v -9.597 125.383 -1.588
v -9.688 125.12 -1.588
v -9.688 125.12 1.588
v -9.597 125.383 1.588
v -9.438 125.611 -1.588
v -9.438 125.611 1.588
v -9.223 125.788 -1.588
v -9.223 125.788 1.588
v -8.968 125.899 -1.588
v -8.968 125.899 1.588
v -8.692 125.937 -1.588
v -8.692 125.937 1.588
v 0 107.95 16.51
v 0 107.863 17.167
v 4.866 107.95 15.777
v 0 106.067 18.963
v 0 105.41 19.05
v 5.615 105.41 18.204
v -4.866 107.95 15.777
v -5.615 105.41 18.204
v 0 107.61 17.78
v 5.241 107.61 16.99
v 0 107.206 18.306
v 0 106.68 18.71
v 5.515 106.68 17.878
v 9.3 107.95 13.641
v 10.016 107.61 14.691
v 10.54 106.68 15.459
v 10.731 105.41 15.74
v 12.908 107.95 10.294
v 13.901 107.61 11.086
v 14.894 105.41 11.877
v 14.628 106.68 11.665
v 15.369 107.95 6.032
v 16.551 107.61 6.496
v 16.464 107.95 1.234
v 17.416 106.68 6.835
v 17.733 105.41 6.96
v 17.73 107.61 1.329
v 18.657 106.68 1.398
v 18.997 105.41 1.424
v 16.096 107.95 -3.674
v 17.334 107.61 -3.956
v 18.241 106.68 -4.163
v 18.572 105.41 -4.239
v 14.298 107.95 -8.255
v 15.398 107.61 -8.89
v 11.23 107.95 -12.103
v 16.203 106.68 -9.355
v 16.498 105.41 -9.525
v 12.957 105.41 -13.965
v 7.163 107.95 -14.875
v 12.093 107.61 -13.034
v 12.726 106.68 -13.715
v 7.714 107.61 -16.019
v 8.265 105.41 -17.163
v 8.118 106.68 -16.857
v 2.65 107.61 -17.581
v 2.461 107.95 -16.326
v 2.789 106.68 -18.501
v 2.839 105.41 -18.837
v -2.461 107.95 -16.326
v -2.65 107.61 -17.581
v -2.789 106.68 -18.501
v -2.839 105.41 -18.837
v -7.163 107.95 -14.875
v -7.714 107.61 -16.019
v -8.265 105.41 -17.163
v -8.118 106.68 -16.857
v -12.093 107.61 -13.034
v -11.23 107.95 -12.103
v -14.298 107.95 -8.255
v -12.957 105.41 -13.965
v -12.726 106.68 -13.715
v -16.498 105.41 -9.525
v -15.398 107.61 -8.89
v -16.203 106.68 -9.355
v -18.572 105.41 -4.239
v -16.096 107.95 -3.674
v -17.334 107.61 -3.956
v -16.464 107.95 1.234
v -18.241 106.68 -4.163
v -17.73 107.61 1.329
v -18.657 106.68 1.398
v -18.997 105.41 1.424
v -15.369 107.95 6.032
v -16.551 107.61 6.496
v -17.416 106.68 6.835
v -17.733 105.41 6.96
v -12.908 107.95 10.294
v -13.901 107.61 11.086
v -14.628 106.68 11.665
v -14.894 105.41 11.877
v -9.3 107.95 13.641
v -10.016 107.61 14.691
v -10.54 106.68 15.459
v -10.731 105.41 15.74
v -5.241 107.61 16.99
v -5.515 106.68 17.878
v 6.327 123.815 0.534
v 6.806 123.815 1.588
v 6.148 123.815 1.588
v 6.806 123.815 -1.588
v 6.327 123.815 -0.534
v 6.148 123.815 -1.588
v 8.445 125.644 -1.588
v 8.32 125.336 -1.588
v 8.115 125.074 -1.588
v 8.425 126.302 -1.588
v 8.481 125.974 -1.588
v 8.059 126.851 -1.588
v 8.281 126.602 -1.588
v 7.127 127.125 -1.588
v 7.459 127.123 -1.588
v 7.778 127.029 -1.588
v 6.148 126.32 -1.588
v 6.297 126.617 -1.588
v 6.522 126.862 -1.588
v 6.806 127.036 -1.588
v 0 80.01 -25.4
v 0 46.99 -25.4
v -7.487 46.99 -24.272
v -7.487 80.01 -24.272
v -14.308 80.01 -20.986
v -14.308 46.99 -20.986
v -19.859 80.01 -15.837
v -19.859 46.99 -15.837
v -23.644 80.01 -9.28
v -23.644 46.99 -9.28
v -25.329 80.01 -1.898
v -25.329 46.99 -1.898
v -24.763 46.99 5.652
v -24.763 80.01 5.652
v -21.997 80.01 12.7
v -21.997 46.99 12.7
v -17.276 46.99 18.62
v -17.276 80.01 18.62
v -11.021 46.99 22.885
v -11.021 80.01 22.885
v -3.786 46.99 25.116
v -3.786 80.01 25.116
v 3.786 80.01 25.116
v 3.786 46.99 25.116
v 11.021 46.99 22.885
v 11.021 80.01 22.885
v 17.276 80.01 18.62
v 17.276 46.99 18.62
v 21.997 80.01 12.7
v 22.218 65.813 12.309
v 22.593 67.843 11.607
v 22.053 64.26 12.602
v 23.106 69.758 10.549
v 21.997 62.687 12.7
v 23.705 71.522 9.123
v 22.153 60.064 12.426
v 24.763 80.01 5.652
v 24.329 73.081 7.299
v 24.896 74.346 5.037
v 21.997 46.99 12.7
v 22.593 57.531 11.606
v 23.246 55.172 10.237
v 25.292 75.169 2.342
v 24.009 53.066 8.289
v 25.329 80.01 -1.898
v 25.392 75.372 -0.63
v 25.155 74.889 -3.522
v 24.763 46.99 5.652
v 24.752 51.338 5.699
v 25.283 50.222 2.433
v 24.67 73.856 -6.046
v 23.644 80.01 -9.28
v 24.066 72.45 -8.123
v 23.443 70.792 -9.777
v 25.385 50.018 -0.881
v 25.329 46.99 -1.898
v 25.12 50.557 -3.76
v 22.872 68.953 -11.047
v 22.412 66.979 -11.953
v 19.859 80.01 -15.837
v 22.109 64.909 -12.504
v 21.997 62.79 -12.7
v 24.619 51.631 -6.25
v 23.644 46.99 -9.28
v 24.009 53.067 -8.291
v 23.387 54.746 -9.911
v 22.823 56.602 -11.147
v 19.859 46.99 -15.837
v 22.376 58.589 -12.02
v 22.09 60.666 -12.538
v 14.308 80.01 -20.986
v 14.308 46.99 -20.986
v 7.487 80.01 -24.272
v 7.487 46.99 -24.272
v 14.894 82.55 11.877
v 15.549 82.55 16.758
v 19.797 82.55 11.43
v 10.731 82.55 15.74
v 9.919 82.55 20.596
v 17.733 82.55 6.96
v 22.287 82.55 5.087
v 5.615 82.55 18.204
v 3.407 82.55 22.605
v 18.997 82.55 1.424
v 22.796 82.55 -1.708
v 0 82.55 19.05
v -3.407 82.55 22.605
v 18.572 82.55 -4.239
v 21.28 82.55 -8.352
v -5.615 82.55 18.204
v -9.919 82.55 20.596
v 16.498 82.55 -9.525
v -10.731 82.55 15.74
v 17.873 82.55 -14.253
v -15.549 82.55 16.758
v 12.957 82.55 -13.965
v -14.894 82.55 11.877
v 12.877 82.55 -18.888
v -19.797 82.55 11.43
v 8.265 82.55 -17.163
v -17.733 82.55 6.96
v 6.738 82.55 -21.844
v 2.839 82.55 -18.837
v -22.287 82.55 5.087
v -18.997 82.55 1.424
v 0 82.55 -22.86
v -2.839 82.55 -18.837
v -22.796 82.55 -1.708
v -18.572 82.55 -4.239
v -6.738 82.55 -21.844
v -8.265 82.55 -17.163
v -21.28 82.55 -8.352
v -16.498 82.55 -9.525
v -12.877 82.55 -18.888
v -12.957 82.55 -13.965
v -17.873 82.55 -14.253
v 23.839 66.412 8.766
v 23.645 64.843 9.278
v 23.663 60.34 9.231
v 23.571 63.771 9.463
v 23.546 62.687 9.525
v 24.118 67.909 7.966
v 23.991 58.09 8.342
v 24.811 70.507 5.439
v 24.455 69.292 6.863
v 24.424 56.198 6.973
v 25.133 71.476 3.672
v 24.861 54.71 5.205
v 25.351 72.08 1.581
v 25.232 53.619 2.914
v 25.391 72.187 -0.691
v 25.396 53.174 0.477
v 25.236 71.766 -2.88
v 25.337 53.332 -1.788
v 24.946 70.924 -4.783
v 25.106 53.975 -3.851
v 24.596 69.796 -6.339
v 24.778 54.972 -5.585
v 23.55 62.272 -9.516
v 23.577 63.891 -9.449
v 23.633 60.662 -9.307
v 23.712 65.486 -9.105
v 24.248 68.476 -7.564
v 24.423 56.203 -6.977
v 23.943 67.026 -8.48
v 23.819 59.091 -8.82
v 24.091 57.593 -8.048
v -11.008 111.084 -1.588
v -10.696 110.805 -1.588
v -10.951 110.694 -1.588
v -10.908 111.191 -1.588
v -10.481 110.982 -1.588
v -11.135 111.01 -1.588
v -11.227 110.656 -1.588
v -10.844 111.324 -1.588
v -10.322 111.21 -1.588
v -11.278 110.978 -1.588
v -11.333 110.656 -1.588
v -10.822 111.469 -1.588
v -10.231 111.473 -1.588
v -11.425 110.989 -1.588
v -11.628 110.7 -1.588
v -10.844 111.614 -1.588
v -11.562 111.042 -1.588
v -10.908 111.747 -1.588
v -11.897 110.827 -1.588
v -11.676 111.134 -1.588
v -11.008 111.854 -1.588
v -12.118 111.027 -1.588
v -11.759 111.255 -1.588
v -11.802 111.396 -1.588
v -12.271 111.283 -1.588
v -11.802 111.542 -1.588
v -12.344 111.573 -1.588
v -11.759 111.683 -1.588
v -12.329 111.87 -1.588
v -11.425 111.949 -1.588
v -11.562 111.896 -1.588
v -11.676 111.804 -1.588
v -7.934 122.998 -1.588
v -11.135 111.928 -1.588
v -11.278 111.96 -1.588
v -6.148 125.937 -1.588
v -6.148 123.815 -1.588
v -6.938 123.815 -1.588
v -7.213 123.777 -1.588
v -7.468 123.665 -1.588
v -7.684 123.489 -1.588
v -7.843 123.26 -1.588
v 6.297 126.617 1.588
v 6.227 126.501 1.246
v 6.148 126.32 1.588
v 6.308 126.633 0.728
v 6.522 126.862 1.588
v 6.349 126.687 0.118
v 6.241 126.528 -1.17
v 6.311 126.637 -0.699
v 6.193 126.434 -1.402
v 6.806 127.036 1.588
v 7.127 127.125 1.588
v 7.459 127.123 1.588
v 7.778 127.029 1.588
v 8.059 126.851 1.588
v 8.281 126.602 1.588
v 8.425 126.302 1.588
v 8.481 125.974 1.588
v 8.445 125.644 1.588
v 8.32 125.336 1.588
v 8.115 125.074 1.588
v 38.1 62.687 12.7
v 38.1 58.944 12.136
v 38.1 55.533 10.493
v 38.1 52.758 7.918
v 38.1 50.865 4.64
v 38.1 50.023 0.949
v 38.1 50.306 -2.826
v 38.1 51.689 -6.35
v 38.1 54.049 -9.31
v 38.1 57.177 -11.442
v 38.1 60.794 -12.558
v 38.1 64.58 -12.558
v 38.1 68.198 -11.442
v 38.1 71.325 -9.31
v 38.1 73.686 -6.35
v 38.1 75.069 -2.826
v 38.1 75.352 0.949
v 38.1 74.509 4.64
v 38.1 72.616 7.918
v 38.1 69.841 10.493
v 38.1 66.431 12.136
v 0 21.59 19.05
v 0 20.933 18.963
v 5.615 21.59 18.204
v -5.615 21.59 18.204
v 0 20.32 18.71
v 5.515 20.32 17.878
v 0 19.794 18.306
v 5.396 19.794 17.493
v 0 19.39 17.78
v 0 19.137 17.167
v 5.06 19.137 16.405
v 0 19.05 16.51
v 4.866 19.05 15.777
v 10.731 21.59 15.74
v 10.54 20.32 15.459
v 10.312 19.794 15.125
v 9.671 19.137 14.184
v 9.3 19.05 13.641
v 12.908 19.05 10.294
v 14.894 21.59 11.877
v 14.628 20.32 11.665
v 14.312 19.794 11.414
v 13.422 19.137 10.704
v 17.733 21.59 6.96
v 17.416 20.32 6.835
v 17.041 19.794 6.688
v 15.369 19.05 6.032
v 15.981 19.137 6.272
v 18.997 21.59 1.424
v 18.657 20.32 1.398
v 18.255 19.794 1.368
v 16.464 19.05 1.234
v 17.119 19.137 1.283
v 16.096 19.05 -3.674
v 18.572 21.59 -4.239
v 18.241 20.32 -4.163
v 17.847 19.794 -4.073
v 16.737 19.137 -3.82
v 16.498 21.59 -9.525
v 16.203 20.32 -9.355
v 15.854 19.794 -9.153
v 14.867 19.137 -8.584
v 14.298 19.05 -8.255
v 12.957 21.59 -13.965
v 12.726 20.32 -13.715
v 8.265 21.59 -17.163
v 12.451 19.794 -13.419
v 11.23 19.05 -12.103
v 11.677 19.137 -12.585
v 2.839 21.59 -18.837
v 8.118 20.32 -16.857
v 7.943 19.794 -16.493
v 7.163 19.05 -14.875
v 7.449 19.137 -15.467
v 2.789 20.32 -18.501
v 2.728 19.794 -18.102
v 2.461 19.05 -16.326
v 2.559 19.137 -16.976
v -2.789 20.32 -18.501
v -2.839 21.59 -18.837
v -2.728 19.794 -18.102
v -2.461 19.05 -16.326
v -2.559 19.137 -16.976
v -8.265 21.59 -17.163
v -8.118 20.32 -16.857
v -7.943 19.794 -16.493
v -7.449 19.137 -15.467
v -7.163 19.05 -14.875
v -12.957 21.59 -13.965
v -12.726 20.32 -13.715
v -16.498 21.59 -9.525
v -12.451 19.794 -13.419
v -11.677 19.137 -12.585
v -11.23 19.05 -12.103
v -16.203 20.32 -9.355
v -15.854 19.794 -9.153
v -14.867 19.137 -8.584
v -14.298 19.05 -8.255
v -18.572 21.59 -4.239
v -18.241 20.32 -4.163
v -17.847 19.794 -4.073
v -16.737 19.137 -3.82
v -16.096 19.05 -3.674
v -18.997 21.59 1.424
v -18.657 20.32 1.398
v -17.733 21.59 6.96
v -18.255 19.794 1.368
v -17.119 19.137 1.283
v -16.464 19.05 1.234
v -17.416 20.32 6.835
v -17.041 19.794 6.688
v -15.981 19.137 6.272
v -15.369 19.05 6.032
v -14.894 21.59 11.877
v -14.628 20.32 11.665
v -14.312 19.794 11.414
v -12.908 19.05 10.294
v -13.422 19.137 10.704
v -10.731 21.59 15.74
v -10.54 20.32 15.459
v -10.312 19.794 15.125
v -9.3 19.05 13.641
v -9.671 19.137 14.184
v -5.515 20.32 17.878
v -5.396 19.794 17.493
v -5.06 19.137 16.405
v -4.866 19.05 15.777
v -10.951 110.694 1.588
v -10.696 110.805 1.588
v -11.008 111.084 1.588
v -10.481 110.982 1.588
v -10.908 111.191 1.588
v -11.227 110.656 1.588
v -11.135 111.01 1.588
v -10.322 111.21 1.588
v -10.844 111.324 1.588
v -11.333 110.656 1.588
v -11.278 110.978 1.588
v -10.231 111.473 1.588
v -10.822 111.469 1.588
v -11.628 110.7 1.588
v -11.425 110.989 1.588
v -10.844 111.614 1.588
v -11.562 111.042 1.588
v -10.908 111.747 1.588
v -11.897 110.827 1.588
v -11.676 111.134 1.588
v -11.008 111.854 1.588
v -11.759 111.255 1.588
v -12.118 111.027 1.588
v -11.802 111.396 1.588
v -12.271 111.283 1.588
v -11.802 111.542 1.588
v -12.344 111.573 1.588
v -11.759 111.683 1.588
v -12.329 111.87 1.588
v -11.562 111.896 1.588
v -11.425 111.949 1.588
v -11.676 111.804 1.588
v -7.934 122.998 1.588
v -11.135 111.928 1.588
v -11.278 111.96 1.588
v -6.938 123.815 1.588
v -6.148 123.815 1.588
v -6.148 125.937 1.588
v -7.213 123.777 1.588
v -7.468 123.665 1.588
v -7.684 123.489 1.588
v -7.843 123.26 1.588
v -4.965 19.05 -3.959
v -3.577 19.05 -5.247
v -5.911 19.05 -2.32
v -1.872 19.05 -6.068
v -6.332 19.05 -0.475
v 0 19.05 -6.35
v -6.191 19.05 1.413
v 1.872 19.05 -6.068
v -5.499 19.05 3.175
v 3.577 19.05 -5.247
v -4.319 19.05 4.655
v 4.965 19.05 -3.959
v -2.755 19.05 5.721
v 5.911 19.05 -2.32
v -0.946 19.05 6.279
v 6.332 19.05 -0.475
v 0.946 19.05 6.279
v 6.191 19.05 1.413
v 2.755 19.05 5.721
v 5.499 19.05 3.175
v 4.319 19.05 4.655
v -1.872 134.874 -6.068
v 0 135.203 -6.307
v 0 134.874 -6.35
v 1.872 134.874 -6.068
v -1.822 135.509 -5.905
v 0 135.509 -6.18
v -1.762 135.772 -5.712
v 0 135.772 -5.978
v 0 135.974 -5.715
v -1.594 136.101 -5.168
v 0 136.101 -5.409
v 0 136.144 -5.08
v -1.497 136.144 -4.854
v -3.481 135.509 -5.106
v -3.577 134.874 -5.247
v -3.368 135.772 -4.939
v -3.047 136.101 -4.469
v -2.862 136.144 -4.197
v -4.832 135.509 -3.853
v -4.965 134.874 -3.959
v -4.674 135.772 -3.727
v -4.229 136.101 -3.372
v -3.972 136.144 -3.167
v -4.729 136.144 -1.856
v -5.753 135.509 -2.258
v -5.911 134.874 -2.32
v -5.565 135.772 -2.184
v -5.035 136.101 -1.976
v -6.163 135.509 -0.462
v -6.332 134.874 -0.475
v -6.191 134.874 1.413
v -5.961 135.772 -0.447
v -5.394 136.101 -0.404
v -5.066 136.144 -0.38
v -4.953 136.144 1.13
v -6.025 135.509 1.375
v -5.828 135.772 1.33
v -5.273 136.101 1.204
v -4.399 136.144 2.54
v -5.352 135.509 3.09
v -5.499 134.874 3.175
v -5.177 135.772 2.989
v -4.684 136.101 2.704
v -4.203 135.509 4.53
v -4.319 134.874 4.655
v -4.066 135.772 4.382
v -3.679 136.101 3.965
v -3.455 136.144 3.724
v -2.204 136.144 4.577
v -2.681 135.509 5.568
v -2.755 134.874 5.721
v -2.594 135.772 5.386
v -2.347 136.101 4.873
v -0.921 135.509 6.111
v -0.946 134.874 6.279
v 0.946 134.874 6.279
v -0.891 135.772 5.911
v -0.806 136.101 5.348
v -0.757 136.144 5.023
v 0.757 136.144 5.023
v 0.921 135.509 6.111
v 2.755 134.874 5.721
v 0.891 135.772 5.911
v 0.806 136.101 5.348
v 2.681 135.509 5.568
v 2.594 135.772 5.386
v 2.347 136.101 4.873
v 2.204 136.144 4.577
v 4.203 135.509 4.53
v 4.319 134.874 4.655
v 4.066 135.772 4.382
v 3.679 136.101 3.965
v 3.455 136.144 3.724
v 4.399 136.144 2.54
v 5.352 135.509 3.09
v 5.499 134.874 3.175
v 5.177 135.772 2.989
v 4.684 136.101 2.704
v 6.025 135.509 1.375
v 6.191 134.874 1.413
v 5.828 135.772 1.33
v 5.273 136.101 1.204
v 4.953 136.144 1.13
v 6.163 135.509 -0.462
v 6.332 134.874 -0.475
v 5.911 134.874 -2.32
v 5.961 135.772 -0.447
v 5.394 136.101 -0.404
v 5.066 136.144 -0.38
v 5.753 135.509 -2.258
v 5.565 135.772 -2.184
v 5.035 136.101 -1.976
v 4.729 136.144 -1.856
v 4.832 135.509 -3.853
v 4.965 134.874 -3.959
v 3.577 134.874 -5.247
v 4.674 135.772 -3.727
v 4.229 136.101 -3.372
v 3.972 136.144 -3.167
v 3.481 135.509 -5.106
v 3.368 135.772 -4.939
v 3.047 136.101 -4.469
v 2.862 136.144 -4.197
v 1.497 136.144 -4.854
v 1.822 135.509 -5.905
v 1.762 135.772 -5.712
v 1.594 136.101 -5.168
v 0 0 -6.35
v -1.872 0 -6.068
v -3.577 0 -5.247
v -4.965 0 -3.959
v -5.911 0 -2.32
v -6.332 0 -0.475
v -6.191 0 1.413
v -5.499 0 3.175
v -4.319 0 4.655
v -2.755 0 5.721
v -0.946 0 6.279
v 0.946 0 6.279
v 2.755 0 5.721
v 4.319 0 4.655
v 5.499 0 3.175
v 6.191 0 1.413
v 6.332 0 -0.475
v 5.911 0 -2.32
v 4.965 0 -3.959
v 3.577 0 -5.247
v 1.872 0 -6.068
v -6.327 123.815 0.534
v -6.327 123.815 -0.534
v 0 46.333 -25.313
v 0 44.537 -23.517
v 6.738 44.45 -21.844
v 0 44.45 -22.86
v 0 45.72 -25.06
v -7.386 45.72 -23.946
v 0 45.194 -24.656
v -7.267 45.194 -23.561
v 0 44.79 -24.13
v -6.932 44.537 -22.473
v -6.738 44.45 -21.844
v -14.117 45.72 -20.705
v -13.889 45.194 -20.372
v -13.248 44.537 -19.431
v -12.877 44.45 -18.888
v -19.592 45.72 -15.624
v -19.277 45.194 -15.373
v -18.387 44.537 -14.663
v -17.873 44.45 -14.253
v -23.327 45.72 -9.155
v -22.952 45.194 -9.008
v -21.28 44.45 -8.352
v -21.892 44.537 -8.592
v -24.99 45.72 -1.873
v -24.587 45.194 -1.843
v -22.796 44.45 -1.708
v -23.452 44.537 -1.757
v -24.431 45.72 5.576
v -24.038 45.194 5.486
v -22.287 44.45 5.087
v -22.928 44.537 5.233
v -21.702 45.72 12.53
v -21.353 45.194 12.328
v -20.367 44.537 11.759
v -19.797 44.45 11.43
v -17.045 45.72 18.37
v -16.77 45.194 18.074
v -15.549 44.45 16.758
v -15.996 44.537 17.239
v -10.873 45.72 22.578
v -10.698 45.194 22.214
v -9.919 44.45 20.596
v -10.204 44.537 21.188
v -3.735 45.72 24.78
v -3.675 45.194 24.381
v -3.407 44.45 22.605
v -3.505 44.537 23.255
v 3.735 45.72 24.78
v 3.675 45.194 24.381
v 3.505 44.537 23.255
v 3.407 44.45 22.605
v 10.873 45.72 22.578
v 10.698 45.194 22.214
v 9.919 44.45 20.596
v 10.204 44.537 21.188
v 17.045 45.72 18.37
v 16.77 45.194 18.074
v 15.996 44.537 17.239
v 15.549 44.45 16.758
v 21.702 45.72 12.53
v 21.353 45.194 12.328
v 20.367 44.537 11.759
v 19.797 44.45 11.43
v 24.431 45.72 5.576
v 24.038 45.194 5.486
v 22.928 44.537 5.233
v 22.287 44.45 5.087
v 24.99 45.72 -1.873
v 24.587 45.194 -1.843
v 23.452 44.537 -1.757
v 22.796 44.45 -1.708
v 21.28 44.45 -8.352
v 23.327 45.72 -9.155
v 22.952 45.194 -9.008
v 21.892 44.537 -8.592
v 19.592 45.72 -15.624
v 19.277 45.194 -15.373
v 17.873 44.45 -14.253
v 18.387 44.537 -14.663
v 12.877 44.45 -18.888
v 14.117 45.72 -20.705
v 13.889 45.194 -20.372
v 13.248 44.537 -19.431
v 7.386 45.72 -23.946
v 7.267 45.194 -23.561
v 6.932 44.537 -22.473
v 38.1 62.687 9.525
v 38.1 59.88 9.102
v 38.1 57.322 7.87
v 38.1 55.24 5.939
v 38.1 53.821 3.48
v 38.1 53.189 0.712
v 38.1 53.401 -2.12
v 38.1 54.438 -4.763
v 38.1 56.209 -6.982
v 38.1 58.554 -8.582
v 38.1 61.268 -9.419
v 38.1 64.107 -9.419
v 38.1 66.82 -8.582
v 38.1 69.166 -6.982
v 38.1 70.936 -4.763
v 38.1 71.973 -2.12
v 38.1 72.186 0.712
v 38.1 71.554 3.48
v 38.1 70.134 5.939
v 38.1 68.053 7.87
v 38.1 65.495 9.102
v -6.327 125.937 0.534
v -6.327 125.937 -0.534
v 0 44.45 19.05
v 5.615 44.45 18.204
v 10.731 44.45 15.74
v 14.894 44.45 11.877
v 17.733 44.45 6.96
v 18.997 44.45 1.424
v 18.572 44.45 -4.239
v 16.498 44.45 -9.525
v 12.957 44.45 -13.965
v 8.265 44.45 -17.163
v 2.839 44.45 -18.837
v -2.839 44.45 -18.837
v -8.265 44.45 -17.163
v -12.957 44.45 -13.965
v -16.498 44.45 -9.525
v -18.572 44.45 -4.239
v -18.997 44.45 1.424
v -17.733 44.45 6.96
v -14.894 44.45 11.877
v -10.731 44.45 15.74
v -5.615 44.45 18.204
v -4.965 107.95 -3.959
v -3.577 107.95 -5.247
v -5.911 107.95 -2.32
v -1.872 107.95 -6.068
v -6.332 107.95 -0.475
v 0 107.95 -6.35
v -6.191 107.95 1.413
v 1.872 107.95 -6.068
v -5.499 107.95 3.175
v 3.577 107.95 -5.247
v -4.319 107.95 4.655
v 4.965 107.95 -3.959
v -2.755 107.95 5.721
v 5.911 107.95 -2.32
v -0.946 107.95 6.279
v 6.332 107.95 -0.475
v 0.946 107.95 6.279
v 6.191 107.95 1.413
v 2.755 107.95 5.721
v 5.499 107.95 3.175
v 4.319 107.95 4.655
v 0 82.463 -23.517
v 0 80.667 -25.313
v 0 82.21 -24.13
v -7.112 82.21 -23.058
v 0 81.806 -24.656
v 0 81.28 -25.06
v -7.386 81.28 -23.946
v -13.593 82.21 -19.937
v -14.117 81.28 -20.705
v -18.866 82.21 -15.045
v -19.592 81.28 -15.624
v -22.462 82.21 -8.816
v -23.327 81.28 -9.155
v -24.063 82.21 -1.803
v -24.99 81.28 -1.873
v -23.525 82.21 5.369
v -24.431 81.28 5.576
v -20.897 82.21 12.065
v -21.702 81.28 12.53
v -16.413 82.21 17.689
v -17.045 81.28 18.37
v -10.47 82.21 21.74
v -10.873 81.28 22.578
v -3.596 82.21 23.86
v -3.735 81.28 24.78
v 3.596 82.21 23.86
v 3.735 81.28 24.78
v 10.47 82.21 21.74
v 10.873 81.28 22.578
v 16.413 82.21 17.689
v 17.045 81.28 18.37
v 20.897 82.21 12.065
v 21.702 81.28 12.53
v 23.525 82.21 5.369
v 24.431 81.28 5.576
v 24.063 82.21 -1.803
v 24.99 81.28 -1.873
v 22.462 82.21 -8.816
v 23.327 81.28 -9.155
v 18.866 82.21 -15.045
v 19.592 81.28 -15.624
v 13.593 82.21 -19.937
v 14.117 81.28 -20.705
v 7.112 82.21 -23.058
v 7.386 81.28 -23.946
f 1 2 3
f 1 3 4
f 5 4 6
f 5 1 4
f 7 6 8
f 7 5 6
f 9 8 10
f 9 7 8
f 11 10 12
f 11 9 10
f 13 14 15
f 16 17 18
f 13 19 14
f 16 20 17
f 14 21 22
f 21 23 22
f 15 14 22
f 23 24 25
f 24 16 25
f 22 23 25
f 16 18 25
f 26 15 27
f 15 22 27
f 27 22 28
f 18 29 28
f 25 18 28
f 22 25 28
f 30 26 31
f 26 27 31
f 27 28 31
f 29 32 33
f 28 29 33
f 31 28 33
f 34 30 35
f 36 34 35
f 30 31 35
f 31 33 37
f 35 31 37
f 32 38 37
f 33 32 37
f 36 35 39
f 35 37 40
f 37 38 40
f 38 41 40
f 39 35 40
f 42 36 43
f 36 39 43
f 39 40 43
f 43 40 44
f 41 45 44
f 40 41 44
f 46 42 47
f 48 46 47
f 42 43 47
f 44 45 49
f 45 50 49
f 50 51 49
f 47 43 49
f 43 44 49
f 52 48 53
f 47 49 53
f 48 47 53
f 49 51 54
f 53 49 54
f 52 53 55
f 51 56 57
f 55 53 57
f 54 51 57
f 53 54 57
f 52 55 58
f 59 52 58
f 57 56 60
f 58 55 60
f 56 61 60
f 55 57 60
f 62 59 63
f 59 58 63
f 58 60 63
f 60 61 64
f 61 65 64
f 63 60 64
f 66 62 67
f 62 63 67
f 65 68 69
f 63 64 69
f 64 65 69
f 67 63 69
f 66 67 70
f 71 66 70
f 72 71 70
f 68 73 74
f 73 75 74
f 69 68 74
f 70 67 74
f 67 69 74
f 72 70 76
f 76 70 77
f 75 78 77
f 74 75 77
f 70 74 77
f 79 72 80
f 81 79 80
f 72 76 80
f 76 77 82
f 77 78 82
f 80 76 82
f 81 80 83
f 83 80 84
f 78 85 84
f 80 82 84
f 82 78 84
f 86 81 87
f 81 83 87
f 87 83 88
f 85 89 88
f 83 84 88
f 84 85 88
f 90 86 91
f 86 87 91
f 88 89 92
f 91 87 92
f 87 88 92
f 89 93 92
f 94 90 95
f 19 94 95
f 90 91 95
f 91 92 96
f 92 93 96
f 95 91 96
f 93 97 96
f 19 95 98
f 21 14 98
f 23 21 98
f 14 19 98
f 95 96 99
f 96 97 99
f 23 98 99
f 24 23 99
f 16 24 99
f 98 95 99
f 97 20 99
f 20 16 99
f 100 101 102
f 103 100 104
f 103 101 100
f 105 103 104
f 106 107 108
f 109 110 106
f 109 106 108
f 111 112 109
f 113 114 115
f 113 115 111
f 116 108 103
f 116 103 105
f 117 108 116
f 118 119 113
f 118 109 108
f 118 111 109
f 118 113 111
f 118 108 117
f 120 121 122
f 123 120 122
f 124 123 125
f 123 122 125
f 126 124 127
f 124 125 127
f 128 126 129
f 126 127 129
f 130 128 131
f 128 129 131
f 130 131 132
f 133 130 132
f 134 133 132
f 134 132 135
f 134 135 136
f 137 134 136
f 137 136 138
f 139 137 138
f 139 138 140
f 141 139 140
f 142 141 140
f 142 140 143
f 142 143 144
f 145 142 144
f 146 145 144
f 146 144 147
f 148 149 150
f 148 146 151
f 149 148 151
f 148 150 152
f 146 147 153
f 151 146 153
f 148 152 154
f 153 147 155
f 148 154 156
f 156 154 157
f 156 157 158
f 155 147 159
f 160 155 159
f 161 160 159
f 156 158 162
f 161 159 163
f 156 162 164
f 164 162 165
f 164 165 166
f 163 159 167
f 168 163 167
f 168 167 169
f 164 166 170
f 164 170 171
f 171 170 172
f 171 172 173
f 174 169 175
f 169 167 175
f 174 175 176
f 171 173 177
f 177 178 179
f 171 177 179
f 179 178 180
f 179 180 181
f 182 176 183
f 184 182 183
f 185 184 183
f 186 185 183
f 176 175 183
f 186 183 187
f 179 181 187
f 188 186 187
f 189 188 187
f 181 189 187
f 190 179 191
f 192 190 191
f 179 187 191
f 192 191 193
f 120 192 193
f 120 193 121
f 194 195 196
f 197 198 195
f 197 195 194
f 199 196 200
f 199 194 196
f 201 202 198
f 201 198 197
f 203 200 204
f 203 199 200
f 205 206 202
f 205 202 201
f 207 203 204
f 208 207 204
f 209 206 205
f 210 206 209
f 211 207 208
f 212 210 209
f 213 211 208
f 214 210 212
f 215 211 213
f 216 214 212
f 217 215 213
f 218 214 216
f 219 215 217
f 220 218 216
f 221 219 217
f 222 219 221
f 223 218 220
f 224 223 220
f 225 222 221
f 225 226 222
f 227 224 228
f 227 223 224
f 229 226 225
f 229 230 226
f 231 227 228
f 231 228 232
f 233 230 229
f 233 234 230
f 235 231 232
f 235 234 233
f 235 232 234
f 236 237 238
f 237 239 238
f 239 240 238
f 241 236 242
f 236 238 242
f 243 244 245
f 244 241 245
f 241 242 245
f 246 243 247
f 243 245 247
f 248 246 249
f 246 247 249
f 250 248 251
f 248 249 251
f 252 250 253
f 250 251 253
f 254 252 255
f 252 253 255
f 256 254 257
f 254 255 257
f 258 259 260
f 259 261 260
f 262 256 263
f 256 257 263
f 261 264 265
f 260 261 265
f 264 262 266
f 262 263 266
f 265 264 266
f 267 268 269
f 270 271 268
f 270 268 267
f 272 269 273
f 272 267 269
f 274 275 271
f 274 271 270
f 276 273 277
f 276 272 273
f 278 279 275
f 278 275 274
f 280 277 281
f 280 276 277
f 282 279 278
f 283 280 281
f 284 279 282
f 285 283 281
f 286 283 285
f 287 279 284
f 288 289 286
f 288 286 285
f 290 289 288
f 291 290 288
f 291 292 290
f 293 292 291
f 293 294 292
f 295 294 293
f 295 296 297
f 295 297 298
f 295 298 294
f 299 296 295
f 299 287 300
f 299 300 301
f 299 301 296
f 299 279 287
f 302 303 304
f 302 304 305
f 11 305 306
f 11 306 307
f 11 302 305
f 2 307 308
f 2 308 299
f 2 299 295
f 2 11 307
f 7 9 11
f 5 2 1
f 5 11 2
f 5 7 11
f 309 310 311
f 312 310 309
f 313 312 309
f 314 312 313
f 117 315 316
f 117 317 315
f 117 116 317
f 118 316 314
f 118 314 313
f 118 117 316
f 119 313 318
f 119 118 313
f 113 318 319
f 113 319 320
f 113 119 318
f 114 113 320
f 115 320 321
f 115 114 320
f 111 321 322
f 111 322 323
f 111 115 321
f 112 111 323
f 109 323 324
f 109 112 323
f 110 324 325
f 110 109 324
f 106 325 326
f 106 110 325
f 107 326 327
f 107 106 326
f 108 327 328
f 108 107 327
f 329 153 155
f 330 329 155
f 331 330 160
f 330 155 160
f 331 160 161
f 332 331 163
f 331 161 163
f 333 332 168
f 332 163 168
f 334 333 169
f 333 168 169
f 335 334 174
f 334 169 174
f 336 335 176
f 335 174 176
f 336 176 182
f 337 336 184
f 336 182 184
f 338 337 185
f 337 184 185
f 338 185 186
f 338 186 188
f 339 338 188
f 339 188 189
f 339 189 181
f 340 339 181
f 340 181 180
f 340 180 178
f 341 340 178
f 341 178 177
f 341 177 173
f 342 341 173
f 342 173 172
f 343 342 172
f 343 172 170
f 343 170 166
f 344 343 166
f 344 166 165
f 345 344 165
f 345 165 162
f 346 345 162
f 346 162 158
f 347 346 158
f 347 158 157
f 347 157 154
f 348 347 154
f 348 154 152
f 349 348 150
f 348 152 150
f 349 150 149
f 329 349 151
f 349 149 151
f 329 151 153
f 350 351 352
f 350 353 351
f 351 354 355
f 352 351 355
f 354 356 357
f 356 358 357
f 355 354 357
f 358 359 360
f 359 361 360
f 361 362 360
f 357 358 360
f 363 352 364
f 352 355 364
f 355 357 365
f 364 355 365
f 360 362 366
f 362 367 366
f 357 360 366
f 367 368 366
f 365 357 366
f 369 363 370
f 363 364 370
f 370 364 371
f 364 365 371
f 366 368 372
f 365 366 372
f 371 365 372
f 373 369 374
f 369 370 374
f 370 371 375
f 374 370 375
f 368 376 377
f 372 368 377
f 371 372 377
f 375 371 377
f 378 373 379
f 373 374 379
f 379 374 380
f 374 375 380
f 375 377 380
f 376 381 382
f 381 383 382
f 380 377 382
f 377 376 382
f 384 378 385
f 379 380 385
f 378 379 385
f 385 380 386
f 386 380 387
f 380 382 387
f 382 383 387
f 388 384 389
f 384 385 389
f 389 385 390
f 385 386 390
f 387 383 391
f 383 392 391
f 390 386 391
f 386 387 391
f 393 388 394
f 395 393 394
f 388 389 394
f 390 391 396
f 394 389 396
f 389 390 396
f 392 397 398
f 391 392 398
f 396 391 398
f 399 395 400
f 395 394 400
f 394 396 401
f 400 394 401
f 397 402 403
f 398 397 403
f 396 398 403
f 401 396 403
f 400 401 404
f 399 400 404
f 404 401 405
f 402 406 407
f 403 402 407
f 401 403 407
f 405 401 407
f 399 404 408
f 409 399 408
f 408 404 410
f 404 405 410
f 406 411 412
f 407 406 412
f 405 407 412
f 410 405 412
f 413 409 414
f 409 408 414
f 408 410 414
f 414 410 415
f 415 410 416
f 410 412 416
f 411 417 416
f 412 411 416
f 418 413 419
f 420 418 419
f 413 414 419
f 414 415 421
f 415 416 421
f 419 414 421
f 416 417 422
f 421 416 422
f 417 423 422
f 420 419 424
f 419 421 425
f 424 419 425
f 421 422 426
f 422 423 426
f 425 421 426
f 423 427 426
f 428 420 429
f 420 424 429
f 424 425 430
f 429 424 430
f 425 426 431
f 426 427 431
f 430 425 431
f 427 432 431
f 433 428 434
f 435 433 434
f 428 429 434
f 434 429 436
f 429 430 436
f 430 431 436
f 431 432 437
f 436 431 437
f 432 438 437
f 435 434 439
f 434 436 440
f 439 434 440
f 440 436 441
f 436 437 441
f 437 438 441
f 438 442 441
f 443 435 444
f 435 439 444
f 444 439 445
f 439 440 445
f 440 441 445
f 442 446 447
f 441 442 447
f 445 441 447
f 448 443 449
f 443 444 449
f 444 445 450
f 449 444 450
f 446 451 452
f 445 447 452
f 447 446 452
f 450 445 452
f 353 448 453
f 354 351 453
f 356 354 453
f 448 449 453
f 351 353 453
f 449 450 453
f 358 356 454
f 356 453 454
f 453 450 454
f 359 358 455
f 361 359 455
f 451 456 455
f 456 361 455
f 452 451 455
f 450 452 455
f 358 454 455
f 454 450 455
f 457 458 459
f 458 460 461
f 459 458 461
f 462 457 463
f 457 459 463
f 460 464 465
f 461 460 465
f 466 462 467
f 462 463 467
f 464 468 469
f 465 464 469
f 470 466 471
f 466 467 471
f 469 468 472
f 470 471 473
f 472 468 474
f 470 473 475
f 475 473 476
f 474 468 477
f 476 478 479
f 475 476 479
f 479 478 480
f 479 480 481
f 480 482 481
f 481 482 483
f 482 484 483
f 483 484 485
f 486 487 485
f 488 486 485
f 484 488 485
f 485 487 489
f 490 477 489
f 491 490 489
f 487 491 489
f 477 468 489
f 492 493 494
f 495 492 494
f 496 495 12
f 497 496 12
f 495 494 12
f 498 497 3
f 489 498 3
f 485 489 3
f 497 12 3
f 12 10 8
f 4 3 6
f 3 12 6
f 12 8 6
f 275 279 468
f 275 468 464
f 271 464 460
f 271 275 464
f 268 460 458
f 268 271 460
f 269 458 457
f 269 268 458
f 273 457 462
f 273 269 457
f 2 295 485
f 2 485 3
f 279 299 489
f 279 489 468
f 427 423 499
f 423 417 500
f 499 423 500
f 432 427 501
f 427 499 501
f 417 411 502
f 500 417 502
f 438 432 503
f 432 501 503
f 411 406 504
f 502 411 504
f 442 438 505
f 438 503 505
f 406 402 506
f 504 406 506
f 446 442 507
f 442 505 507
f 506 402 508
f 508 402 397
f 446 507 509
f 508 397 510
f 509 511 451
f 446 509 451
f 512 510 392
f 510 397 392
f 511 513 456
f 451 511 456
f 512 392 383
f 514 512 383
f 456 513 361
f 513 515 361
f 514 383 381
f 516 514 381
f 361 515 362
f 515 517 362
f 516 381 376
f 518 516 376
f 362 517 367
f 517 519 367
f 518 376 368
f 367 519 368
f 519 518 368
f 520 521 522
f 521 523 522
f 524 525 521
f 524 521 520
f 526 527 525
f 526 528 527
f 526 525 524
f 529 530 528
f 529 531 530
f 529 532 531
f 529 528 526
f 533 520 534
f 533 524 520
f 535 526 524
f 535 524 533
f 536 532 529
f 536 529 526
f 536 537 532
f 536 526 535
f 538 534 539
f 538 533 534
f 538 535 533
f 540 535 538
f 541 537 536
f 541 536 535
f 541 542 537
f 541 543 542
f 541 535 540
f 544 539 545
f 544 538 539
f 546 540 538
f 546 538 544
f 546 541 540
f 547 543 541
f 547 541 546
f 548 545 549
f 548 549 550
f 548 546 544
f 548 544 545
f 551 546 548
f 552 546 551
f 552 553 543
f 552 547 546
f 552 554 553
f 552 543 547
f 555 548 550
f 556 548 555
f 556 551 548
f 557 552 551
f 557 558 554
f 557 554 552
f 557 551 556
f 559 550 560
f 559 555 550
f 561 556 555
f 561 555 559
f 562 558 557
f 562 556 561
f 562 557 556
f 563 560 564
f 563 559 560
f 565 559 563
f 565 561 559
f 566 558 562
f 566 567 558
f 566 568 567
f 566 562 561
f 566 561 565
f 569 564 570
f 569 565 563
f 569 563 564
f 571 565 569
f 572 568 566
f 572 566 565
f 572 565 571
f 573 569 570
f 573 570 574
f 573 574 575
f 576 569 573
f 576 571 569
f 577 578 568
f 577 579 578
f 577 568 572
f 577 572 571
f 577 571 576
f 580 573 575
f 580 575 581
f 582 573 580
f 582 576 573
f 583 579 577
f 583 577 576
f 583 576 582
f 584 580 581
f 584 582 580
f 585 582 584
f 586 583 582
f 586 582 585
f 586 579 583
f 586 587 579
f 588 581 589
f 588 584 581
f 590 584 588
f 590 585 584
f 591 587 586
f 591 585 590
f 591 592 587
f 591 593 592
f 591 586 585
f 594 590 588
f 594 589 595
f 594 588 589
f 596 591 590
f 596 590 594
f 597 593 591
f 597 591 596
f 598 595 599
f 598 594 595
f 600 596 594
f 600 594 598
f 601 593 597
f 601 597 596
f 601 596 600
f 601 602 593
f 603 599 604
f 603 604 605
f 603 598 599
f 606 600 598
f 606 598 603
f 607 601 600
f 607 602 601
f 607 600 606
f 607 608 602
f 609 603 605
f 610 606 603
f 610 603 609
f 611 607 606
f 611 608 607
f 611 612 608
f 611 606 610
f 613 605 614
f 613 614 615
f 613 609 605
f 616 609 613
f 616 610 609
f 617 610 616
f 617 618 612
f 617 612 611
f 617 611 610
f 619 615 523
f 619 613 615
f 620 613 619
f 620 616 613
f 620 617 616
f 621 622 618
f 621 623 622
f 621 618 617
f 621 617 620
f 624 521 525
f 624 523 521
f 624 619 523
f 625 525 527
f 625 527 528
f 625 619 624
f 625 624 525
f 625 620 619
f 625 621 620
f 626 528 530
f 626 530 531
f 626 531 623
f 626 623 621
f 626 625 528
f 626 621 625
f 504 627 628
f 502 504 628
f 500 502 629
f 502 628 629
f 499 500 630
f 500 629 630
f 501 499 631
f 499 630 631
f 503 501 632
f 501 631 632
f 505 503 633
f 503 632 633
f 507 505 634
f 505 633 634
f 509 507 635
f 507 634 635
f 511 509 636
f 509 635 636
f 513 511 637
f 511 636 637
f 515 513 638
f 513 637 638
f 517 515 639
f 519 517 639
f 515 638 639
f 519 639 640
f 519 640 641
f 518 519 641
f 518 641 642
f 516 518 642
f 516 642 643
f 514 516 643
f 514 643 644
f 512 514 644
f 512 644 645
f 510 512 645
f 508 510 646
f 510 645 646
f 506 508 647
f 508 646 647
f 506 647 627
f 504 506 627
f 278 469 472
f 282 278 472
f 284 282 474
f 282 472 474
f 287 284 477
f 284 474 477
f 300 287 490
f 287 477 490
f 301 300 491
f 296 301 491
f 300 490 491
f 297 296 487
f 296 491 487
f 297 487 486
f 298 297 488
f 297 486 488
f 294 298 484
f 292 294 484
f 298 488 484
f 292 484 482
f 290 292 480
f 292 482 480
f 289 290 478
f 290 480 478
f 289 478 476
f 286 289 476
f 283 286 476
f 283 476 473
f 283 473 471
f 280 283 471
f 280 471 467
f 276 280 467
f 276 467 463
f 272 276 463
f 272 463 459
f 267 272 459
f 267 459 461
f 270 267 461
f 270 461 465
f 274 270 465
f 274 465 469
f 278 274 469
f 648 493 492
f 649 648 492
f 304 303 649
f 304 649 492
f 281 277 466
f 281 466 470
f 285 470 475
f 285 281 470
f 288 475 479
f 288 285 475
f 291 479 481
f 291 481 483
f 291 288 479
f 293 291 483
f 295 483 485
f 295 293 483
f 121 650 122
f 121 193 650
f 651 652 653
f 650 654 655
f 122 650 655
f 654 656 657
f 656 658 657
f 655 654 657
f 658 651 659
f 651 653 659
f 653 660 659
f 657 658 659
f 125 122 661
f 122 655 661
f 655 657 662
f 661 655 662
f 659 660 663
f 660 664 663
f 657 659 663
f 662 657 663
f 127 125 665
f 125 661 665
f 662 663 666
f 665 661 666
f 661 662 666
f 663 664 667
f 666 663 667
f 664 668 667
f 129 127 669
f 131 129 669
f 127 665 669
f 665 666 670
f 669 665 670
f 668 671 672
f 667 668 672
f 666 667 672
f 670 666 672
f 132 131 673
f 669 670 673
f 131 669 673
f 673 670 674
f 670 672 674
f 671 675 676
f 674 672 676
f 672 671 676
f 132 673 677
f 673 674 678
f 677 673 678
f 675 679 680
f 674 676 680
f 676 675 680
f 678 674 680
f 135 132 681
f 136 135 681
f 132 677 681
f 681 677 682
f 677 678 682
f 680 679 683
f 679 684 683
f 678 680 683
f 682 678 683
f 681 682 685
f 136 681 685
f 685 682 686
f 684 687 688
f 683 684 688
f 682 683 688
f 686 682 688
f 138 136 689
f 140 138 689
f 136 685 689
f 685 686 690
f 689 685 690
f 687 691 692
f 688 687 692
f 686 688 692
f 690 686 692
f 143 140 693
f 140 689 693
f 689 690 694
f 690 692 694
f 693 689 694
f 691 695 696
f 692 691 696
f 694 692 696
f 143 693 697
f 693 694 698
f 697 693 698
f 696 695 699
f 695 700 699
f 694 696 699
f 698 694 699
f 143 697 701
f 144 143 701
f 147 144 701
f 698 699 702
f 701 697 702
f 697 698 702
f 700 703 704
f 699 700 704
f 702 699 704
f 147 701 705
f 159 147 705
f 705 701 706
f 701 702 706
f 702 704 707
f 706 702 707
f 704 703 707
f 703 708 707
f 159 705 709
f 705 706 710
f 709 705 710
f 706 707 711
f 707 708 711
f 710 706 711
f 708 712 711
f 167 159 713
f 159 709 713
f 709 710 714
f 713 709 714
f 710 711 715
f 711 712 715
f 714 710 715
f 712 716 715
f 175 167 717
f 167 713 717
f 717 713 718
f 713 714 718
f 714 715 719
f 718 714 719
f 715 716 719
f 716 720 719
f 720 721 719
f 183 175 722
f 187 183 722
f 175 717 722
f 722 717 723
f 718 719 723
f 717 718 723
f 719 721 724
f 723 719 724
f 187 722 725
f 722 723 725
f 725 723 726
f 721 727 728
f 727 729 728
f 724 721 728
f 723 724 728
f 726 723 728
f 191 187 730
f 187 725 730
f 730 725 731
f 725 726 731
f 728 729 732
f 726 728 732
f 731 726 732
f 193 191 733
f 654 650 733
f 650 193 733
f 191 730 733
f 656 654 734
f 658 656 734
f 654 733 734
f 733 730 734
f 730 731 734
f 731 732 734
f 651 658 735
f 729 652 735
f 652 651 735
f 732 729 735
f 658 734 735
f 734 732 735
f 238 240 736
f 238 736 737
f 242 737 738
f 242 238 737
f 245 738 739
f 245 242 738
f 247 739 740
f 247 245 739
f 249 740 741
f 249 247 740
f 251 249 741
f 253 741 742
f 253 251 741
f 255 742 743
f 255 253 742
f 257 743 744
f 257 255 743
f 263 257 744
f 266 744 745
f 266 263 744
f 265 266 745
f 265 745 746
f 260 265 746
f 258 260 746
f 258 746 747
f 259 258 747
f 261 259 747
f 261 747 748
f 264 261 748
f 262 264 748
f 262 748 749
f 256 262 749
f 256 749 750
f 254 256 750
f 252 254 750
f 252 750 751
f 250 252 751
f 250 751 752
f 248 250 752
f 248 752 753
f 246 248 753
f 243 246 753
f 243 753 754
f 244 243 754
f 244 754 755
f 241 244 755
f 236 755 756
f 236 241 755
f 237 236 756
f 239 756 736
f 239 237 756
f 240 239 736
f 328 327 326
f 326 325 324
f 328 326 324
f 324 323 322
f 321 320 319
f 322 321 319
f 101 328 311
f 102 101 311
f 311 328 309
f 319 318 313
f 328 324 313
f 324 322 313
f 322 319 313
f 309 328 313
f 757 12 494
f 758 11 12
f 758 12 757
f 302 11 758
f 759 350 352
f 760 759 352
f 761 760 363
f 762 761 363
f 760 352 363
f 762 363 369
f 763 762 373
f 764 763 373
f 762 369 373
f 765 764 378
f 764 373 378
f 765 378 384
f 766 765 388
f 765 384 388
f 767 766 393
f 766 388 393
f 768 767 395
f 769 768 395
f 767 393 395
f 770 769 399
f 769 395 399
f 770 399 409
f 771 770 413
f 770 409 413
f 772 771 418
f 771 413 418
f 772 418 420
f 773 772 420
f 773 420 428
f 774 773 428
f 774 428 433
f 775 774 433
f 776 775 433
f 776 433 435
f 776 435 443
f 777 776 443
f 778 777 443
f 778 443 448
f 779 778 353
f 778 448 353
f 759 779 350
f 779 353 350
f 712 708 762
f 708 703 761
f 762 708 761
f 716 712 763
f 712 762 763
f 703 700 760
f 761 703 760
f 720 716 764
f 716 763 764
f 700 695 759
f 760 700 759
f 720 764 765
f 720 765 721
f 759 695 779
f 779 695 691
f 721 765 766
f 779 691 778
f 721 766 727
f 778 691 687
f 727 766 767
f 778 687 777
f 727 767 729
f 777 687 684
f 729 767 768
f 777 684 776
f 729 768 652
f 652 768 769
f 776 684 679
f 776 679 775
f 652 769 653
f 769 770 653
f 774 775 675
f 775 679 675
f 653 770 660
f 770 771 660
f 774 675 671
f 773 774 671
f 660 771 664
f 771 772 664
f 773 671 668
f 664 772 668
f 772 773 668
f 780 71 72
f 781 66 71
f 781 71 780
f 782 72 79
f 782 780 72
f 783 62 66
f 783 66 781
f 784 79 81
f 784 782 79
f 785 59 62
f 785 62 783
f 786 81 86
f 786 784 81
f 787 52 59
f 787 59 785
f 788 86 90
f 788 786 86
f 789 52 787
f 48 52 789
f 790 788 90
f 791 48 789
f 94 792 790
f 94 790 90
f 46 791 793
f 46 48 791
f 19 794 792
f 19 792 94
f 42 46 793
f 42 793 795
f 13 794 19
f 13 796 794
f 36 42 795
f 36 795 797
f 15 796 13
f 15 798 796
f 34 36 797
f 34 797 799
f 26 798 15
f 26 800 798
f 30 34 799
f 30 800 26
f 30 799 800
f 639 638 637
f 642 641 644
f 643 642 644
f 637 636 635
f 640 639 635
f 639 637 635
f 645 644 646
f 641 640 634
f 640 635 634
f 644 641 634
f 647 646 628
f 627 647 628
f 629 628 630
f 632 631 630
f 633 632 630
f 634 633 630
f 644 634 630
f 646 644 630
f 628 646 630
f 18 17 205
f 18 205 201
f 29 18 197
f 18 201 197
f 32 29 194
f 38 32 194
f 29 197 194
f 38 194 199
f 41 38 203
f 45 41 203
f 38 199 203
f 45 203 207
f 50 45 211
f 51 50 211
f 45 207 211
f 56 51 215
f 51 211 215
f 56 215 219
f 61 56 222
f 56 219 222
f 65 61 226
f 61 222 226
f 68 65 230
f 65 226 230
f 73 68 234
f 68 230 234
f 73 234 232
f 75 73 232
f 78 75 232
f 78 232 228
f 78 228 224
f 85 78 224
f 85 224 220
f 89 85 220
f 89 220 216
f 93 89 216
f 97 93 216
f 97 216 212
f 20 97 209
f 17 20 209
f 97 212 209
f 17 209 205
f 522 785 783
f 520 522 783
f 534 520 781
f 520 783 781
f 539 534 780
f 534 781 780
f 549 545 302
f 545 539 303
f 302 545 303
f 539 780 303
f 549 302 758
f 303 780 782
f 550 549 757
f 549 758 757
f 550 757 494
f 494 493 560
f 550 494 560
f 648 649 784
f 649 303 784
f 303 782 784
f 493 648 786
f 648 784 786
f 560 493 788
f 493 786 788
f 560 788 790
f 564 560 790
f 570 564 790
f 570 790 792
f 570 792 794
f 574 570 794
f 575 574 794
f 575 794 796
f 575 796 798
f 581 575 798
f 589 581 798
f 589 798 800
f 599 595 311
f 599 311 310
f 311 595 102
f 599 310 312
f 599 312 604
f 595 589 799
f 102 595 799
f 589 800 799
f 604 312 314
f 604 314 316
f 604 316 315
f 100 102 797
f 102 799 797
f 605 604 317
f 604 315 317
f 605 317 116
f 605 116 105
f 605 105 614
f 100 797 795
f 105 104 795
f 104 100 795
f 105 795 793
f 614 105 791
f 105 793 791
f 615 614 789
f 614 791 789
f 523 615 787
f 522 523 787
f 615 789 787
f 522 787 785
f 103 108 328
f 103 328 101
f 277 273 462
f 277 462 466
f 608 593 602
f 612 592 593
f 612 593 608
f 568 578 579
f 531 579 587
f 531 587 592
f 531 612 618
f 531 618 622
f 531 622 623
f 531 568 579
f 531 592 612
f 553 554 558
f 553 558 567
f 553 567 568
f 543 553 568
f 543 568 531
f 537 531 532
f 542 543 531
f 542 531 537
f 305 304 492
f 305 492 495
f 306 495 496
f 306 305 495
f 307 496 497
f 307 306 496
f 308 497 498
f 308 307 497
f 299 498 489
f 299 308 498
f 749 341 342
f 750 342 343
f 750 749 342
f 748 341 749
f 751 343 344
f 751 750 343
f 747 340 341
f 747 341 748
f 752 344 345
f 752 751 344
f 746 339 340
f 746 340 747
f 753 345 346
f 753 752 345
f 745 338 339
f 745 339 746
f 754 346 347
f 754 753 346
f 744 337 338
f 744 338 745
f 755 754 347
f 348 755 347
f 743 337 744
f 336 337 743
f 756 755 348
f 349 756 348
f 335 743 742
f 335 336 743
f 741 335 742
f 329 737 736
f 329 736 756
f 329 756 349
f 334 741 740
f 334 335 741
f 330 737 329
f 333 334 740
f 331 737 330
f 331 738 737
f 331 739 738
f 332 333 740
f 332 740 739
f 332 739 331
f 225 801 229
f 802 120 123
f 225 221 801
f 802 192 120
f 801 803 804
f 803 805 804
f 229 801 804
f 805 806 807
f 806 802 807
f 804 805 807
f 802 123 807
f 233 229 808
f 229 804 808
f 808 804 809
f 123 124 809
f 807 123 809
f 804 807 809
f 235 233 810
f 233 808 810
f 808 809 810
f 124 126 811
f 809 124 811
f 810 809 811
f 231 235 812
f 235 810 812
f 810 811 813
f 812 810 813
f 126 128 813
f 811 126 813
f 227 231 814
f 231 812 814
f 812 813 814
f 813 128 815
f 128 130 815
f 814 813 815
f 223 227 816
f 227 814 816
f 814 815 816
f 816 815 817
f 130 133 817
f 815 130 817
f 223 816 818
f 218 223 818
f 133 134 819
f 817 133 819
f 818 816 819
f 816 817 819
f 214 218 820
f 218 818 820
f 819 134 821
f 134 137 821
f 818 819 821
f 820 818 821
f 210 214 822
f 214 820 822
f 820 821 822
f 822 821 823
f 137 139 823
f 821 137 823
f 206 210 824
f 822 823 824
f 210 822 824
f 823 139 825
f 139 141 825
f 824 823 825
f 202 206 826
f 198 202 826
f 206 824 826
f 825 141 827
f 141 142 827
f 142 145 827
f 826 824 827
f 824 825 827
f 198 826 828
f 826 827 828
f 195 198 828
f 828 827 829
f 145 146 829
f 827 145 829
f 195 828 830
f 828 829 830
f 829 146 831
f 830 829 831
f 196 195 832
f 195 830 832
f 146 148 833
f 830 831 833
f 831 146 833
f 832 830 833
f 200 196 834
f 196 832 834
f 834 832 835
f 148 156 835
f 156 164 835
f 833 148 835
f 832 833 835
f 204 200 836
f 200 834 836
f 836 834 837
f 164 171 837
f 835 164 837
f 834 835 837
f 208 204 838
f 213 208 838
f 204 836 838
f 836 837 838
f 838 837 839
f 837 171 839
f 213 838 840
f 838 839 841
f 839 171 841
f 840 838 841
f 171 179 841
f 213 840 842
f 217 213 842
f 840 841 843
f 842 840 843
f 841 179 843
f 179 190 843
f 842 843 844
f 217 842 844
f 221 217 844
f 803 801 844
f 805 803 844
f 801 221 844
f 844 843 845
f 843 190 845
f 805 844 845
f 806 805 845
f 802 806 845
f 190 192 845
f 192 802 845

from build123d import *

# Parameters (mm, degrees)
SKETCH1_R                = 6.35
BOSS_EXTRUDE1_DEPTH      = 19.05
SKETCH2_R                = 19.05
BOSS_EXTRUDE2_DEPTH      = 25.4
SKETCH3_R                = 25.4
BOSS_EXTRUDE3_DEPTH      = 38.1
SKETCH4_R                = 19.05
BOSS_EXTRUDE4_DEPTH      = 25.4
SKETCH6_R                = 6.35
BOSS_EXTRUDE5_DEPTH      = 28.194
SKETCH8_R                = 12.7
SKETCH8_R_2              = 9.525
BOSS_EXTRUDE7_DEPTH      = 38.1
BOSS_EXTRUDE8_DEPTH      = 1.5875
BOSS_EXTRUDE8_DEPTH_BACK = 1.5875
FILLET1_R                = 2.54
FILLET3_R                = 1.27
CUT_EXTRUDE1_REACH       = 145.927
SKETCH10_R               = 0.492787201


with BuildPart() as part:
    # Sketch1 → Boss-Extrude1 (new body)
    with BuildSketch(Plane(origin=(0, 0, 0), x_dir=(1, 0, 0), z_dir=(0, 1, 0))):
        Circle(SKETCH1_R)
    extrude(amount=BOSS_EXTRUDE1_DEPTH)

    # Sketch2 → Boss-Extrude2 (add)
    with BuildSketch(Plane(origin=(0, 19.05, 0), x_dir=(1, 0, 0), z_dir=(0, 1, 0))):
        Circle(SKETCH2_R)
    extrude(amount=BOSS_EXTRUDE2_DEPTH)

    # Sketch3 → Boss-Extrude3 (add)
    with BuildSketch(Plane(origin=(0, 44.45, 0), x_dir=(1, 0, 0), z_dir=(0, 1, 0))):
        Circle(SKETCH3_R)
    extrude(amount=BOSS_EXTRUDE3_DEPTH)

    # Sketch4 → Boss-Extrude4 (add)
    with BuildSketch(Plane(origin=(0, 82.55, 0), x_dir=(1, 0, 0), z_dir=(0, 1, 0))):
        Circle(SKETCH4_R)
    extrude(amount=BOSS_EXTRUDE4_DEPTH)

    # Sketch6 → Boss-Extrude5 (add)
    with BuildSketch(Plane(origin=(0, 107.95, 0), x_dir=(1, 0, 0), z_dir=(0, 1, 0))):
        Circle(SKETCH6_R)
    extrude(amount=BOSS_EXTRUDE5_DEPTH)

    # Sketch8 → Boss-Extrude7 (add)
    with BuildSketch(Plane(origin=(0, 0, 0), x_dir=(0, 0, -1), z_dir=(1, 0, 0))):
        with Locations((0, 62.6872)):
            Circle(SKETCH8_R)
        with Locations((0, 62.6872)):
            Circle(SKETCH8_R_2, mode=Mode.SUBTRACT)
    extrude(amount=BOSS_EXTRUDE7_DEPTH)

    # Sketch9 → Boss-Extrude8 (add, two sides: drawn at the far end of the back side and taken through both)
    with BuildSketch(Plane.XY.offset(-BOSS_EXTRUDE8_DEPTH_BACK)):
        with BuildLine():
            Line((8.114515419, 125.073963283), (6.806070155, 123.814961738))
            Line((6.806070155, 123.814961738), (-6.937623928, 123.814961738))
            ThreePointArc((-6.937623928, 123.814961738), (-7.582023221, 123.584458747), (-7.934028883, 122.997539593))
            Line((-7.934028883, 122.997539593), (-10.230756182, 111.473241157))
            ThreePointArc((-10.230756182, 111.473241157), (-10.582761844, 110.886322003), (-11.227161138, 110.655819012))
            Line((-11.227161138, 110.655819012), (-11.332644522, 110.655819012))
            ThreePointArc((-11.332644522, 110.655819012), (-12.11814153, 111.027419718), (-12.329049477, 111.870396866))
            Line((-12.329049477, 111.870396866), (-9.688493735, 125.119924761))
            ThreePointArc((-9.688493735, 125.119924761), (-9.336488073, 125.706843914), (-8.692088779, 125.937346906))
            Line((-8.692088779, 125.937346906), (6.085596345, 125.937346906))
            ThreePointArc((6.085596345, 125.937346906), (7.752909986, 127.03983771), (8.114515419, 125.073963283))
        make_face()
    extrude(amount=BOSS_EXTRUDE8_DEPTH + BOSS_EXTRUDE8_DEPTH_BACK)

    # Fillet1
    fillet1_edges = [part.edges().sort_by_distance(p)[0] for p in [
        (-19.05, 19.05, 0),
        (-25.4, 44.45, 0),
        (-25.4, 82.55, 0),
        (-19.05, 107.95, 0),
    ]]
    fillet(fillet1_edges, radius=FILLET1_R)

    # Fillet3
    fillet3_edges = [part.edges().sort_by_distance(p)[0] for p in [
        (-6.35, 136.144, 0),
    ]]
    fillet(fillet3_edges, radius=FILLET3_R)

    # Sketch10 → Cut-Extrude1 (cut, up to next)
    with BuildSketch(Plane.XY.offset(1.5875), mode=Mode.PRIVATE) as cut_extrude1_sk1:
        with Locations((-11.315111441, 111.468988839)):
            Circle(SKETCH10_R)
    cut_extrude1_tool1 = extrude(cut_extrude1_sk1.sketch, amount=-CUT_EXTRUDE1_REACH, mode=Mode.PRIVATE) & part.part
    add(cut_extrude1_tool1.solids().sort_by_distance((-11.315111, 111.468989, 1.5875))[0], mode=Mode.SUBTRACT)


solid = part.part
